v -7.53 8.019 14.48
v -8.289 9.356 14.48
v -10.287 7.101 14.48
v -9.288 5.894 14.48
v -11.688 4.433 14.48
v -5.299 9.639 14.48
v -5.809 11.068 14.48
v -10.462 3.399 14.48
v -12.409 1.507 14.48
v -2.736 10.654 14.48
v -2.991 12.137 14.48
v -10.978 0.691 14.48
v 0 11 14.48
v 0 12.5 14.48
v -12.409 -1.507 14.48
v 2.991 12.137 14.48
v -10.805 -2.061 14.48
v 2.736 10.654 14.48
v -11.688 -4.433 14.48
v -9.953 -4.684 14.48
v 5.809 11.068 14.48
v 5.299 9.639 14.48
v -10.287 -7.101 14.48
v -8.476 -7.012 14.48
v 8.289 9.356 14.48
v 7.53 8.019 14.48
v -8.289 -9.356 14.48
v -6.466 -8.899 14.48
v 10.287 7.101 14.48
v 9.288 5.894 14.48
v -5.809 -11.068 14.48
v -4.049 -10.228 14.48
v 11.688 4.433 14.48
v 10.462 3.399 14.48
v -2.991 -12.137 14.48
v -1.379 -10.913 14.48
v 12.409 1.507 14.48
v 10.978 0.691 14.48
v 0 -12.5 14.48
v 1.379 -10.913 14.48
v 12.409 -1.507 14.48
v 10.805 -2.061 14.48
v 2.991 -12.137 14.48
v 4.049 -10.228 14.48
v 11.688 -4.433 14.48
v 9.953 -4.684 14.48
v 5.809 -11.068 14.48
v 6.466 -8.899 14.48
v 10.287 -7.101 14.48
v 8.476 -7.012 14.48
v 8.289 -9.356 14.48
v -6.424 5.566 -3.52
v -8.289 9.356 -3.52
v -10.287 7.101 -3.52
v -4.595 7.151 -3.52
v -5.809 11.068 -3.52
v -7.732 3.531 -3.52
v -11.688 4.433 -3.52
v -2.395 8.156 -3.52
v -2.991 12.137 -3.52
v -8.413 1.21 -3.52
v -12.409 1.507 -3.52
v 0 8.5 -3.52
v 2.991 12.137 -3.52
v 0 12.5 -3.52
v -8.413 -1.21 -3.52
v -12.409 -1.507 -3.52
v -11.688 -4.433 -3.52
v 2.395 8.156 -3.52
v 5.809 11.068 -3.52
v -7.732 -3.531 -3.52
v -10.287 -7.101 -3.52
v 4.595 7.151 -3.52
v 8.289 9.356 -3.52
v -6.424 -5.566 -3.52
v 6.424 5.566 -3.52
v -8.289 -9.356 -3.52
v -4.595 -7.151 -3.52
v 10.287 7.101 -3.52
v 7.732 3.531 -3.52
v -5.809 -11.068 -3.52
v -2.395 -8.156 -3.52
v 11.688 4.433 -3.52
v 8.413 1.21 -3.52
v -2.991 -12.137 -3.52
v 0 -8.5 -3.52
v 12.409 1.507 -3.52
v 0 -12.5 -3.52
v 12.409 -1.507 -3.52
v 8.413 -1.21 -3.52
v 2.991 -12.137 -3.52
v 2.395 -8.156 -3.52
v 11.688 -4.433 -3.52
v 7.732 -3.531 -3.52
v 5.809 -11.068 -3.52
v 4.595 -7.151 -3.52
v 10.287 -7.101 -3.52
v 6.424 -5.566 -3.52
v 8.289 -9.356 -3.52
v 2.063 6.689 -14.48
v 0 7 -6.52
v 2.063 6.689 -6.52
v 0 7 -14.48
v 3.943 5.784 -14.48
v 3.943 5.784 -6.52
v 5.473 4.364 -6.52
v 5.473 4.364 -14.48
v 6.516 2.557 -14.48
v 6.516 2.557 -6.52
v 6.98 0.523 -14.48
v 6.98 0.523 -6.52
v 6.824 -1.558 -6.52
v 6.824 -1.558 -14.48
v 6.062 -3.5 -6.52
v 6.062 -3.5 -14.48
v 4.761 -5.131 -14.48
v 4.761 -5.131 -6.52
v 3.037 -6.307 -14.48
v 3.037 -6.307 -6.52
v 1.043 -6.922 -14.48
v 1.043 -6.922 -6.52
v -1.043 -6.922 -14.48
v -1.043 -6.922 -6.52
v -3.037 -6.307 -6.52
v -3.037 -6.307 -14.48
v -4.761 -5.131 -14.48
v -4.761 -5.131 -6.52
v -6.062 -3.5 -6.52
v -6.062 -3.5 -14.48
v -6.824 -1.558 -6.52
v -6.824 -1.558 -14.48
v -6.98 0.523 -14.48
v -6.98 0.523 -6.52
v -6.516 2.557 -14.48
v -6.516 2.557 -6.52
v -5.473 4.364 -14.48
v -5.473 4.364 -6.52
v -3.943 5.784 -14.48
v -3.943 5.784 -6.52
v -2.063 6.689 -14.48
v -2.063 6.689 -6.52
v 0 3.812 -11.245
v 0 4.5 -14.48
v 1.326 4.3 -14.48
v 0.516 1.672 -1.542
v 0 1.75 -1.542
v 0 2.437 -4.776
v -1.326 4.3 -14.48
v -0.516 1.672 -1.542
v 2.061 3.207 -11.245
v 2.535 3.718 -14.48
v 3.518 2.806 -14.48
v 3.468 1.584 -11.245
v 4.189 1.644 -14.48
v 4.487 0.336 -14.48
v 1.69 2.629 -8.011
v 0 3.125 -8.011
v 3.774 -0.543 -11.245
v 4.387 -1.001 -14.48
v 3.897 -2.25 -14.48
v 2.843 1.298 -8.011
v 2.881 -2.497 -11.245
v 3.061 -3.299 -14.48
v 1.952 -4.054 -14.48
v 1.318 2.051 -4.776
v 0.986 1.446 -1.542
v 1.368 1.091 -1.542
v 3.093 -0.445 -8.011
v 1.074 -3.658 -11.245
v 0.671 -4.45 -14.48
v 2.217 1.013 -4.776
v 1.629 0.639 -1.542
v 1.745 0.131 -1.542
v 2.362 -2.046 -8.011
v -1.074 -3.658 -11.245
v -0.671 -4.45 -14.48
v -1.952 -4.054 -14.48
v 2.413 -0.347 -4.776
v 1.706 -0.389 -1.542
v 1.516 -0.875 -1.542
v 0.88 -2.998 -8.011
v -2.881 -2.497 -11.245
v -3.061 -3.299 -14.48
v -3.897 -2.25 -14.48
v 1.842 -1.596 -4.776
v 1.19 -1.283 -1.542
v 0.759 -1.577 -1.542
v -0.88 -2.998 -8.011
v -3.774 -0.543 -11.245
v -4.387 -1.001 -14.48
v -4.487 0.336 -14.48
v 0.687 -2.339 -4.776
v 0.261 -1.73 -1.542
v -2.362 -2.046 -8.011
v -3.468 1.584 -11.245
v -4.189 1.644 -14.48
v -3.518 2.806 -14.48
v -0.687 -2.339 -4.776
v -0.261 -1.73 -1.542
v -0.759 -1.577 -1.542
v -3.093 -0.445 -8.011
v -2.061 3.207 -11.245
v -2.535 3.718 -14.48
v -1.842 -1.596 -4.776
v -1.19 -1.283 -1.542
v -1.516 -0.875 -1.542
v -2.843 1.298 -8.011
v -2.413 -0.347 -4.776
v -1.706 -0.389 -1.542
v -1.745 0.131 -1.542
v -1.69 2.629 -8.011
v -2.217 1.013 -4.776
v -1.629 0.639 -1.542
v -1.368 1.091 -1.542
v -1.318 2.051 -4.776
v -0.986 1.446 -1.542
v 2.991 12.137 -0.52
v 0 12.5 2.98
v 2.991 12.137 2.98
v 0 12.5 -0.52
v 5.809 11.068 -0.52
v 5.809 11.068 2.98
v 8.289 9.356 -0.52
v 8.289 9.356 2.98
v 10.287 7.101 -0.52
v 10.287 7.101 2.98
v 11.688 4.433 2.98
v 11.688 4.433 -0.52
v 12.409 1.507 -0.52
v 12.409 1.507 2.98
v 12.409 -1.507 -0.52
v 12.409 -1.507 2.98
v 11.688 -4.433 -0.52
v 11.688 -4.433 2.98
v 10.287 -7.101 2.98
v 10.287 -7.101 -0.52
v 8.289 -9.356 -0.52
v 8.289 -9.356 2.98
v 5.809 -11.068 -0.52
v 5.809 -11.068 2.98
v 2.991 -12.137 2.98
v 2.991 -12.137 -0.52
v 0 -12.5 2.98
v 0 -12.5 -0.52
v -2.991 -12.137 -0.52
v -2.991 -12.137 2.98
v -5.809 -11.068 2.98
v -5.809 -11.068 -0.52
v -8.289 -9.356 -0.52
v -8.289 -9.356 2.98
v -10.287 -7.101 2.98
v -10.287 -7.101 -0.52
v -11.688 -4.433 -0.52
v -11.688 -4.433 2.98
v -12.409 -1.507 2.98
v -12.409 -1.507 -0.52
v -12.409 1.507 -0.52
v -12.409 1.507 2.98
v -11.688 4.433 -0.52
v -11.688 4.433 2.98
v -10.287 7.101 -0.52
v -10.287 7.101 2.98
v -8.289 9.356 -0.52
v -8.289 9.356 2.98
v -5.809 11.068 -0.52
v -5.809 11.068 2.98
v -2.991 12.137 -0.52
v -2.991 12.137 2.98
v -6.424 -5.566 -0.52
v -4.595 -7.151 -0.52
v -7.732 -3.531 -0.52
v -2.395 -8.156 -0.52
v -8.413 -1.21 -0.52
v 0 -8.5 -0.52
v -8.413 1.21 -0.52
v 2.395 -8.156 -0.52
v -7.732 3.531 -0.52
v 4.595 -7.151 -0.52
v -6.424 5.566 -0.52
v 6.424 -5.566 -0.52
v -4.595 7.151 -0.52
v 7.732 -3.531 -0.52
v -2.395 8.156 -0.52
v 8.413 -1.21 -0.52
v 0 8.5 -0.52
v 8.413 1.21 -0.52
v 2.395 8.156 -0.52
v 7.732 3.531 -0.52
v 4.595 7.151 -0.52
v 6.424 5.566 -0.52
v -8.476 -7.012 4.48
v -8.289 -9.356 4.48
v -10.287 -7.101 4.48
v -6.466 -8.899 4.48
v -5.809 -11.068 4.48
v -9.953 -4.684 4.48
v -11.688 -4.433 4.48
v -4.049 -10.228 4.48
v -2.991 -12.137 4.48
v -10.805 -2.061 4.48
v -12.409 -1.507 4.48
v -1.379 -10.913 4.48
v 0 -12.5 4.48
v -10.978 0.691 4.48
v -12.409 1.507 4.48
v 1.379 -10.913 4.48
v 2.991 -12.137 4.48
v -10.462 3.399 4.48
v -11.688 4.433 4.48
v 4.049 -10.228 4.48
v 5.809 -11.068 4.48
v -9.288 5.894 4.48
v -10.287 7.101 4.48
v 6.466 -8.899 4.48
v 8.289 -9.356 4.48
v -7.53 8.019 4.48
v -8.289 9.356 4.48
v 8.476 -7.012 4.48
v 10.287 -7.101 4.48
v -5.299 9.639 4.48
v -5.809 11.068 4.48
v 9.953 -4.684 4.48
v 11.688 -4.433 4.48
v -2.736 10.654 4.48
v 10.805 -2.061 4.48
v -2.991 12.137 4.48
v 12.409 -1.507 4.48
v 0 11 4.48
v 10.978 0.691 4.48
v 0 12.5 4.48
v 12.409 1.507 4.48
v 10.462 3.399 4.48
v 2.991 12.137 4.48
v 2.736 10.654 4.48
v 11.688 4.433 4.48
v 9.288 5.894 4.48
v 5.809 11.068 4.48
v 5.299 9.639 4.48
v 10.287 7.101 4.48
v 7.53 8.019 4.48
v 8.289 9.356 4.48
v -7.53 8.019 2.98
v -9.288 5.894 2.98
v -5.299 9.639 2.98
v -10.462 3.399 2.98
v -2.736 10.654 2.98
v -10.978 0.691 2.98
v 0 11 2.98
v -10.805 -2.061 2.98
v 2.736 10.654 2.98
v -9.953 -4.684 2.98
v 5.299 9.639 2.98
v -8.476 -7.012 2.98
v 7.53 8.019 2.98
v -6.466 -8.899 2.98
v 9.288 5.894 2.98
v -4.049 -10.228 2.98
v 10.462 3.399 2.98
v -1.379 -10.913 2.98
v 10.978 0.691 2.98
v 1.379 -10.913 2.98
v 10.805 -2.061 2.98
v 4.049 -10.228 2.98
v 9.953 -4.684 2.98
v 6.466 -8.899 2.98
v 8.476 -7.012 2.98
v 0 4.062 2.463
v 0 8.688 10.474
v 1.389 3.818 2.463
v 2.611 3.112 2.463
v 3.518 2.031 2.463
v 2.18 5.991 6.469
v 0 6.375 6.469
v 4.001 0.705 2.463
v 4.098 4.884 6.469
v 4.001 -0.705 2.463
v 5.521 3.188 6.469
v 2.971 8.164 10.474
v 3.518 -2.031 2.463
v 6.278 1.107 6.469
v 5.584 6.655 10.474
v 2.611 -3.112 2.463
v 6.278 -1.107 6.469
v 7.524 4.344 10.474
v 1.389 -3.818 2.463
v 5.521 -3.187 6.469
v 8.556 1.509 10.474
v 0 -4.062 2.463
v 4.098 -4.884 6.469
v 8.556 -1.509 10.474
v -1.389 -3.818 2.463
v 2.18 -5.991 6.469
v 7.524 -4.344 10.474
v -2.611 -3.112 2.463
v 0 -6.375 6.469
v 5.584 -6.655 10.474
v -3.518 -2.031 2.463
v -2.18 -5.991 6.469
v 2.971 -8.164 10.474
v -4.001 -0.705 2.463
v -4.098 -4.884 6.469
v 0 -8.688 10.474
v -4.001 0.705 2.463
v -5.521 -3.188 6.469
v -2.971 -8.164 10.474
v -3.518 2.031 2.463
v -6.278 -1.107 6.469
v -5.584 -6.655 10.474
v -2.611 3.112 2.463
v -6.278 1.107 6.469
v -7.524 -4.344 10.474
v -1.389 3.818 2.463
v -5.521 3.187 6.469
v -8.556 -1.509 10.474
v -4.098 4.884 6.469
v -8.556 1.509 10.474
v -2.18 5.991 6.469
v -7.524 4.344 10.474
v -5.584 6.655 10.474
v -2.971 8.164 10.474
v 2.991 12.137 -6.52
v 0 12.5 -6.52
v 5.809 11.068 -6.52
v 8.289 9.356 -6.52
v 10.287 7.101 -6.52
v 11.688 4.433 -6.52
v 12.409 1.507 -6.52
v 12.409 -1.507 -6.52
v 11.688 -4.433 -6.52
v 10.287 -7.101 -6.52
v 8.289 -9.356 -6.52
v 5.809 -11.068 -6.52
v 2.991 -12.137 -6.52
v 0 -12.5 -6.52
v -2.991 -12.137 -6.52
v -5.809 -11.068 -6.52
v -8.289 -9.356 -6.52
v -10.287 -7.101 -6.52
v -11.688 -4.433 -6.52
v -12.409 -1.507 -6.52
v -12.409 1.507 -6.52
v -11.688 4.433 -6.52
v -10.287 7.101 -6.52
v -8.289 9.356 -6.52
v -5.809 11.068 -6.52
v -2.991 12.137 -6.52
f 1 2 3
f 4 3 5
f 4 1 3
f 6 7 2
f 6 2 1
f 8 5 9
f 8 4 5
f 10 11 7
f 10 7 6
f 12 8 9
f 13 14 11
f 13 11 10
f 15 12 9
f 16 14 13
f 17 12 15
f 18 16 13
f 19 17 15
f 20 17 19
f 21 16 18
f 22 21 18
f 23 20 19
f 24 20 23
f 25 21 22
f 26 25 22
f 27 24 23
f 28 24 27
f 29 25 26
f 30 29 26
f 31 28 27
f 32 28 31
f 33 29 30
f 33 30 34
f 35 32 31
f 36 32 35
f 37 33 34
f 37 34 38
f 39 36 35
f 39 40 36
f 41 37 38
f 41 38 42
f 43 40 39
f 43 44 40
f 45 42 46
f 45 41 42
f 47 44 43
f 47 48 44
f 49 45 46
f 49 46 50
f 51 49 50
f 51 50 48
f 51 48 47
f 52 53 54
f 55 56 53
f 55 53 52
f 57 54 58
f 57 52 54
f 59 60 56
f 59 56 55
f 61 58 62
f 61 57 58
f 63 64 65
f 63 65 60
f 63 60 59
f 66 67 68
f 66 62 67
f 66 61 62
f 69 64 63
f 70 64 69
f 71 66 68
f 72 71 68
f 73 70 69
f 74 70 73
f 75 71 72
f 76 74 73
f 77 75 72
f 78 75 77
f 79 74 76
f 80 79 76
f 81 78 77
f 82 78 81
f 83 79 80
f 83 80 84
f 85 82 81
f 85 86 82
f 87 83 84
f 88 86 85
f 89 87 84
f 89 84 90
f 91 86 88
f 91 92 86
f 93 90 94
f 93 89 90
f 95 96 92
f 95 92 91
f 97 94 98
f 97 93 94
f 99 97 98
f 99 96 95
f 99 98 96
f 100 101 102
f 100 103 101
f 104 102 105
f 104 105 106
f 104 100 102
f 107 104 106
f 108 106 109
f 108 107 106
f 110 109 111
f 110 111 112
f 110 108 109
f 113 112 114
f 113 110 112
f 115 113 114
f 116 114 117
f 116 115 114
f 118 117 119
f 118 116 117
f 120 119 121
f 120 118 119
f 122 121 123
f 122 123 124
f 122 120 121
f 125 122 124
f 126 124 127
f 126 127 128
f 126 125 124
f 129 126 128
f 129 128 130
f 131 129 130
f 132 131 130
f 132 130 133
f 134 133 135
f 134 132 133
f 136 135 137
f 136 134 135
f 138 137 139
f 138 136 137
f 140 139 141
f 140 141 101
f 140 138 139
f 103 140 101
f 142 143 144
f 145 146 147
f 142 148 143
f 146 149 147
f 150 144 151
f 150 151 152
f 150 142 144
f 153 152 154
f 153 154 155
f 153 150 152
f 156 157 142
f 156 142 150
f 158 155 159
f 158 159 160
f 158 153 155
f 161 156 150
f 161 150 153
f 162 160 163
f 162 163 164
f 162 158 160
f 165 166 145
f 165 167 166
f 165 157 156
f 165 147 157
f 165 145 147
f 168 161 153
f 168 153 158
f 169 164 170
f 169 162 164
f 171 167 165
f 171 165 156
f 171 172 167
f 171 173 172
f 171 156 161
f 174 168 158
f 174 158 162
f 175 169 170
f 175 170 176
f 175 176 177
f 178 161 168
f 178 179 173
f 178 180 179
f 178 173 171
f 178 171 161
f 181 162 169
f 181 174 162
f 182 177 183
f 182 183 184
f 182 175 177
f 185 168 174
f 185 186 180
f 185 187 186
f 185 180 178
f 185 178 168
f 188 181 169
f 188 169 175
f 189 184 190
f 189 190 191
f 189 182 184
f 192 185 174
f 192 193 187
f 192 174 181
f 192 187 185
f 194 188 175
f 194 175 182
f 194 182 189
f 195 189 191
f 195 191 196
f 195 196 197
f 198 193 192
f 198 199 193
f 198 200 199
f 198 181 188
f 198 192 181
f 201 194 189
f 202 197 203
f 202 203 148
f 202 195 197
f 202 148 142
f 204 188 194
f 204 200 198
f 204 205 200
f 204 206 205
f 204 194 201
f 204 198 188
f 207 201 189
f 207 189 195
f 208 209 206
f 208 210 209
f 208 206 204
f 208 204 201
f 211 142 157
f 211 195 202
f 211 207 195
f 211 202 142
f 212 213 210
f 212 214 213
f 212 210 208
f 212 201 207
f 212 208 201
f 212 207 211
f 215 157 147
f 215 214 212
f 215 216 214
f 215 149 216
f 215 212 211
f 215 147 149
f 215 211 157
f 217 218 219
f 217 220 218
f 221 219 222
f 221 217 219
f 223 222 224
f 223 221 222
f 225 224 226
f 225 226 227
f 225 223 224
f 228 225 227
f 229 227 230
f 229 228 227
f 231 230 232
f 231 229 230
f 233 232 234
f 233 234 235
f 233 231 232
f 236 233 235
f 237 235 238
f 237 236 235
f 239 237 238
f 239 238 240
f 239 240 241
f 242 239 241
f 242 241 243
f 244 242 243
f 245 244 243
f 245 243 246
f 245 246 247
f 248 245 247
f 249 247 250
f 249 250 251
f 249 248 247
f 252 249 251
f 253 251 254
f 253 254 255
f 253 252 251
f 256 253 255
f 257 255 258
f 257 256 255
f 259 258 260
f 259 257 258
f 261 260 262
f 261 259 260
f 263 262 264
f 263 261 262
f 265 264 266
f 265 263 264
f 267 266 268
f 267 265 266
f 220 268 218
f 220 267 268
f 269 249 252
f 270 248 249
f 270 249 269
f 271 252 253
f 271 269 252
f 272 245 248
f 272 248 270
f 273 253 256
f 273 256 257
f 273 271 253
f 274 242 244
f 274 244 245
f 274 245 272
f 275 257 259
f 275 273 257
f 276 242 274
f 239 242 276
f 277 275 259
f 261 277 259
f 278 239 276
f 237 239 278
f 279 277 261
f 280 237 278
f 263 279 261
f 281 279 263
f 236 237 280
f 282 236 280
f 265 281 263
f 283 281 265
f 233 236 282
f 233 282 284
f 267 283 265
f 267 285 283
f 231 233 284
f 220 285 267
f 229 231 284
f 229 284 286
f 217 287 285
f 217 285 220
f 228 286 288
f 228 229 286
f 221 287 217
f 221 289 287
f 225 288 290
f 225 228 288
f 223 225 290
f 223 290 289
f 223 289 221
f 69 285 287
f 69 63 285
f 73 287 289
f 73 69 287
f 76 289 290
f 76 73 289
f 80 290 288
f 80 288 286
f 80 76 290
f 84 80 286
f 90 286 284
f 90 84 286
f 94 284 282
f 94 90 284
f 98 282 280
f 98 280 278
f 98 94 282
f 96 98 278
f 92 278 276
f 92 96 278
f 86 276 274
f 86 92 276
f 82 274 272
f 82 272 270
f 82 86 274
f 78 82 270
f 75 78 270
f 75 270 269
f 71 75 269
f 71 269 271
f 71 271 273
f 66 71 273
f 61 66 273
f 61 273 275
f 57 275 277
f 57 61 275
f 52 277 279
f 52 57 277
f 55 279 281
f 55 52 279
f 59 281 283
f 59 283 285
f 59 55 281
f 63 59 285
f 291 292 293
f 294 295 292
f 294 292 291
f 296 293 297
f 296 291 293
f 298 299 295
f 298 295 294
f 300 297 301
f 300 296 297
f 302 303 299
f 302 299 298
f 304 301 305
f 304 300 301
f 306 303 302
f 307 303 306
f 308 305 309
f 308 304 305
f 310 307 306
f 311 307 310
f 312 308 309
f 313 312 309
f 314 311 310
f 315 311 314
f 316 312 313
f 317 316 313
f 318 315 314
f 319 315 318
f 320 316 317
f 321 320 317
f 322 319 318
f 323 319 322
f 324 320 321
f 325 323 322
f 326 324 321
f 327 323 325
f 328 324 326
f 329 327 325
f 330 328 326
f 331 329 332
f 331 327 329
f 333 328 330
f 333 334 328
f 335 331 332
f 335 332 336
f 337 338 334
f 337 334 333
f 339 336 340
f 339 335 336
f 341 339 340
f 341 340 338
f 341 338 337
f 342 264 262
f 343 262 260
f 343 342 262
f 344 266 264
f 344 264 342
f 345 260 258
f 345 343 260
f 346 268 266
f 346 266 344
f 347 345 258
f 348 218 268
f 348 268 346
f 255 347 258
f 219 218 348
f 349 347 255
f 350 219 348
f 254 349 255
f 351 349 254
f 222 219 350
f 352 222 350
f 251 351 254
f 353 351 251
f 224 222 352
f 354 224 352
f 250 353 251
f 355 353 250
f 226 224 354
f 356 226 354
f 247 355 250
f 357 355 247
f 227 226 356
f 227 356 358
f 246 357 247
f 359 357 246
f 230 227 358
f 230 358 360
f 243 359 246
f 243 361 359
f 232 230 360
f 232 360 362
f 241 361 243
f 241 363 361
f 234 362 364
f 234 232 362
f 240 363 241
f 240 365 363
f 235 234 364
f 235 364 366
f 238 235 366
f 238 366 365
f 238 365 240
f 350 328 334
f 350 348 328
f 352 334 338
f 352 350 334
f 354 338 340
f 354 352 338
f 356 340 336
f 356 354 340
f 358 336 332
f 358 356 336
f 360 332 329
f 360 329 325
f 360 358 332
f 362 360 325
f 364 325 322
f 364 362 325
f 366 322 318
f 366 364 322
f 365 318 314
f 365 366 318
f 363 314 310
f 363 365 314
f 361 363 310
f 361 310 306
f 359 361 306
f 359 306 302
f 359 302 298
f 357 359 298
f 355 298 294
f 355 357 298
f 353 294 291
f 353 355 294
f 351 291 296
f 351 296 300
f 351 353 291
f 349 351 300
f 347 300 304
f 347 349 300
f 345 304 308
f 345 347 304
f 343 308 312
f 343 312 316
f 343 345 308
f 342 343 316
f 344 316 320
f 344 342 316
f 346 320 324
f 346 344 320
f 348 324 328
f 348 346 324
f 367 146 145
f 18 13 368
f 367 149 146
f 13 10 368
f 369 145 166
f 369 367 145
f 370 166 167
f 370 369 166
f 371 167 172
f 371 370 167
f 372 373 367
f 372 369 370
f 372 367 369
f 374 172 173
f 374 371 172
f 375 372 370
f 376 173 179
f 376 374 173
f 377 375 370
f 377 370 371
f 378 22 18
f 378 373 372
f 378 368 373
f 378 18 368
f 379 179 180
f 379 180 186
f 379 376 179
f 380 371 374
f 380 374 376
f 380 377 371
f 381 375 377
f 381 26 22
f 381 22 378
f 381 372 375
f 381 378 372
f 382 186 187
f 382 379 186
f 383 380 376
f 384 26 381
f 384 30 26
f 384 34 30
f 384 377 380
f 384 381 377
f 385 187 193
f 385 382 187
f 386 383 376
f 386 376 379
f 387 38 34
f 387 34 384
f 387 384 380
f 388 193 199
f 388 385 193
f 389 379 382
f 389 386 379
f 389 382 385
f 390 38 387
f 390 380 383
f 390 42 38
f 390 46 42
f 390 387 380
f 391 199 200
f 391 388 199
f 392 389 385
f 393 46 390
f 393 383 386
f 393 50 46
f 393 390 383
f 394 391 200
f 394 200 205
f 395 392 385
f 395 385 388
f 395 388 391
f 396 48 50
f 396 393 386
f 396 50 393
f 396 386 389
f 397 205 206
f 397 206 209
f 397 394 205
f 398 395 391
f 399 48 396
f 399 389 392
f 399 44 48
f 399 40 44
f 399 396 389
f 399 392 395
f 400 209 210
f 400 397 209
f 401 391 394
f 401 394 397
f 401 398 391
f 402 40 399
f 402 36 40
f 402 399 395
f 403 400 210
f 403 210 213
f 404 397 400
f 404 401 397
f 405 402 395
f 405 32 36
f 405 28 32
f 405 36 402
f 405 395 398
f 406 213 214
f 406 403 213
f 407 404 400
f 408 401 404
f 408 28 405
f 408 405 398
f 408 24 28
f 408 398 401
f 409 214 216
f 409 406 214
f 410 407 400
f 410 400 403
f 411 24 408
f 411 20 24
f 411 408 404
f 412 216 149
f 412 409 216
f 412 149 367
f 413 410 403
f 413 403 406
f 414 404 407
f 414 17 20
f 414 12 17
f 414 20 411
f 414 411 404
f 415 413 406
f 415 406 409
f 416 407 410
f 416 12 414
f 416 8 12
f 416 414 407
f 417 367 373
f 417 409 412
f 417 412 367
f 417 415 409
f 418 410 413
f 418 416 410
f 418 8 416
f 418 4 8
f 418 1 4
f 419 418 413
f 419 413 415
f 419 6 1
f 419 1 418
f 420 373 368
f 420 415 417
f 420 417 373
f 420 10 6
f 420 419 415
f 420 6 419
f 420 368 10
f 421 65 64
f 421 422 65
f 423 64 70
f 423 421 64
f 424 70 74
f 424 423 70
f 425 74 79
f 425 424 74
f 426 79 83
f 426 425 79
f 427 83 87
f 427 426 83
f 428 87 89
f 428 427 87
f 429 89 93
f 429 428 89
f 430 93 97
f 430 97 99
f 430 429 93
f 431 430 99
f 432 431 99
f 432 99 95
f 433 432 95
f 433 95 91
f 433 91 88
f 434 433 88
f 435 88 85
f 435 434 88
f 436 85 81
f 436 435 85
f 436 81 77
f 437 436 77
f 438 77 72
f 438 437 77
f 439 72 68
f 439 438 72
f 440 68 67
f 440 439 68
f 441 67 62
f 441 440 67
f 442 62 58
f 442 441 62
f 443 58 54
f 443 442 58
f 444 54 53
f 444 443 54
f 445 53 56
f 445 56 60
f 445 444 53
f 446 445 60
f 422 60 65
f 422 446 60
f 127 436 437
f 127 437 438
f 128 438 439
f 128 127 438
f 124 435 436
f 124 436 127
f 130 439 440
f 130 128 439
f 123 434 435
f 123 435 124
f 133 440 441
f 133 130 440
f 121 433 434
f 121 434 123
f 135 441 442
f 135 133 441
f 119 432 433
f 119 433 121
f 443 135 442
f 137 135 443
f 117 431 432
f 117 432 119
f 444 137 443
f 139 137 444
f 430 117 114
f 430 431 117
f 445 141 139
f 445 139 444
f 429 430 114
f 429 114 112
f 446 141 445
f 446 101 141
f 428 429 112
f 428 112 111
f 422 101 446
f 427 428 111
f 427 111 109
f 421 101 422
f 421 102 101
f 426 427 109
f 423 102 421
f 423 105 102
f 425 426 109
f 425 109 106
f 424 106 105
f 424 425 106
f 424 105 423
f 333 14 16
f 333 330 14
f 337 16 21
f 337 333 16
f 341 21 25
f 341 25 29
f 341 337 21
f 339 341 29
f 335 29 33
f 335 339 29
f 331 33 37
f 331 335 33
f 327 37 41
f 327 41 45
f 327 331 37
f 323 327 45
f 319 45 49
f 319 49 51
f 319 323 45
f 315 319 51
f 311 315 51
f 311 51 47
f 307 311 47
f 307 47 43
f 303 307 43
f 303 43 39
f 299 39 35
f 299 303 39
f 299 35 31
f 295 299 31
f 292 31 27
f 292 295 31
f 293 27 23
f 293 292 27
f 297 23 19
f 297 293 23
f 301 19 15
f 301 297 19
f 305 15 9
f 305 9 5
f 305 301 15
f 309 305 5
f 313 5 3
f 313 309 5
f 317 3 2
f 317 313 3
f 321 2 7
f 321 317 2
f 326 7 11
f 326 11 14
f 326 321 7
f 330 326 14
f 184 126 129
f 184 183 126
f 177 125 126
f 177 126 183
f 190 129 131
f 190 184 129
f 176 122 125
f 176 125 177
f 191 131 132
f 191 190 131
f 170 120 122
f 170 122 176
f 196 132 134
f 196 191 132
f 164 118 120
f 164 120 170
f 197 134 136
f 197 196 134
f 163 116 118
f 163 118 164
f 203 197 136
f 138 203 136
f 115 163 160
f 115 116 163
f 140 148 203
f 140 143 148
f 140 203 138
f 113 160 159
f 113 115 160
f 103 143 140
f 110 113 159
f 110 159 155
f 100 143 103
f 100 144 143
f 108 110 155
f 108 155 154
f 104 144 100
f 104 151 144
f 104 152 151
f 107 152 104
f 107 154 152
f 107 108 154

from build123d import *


with BuildPart() as part:
    # Esquisse1 → Révolution1 (revolve)
    with BuildSketch(Plane(origin=(0, 0, 0), x_dir=(0, 0, -1), z_dir=(1, 0, 0))):
        Polygon((-14.479601386, 12.5), (-4.479601386, 12.5), (-4.479601386, 11), (-2.979601386, 11), (-2.979601386, 12.5), (0.520398614, 12.5), (0.520398614, 8.5), (3.520398614, 8.5), (3.520398614, 12.5), (6.520398614, 12.5), (6.520398614, 7), (14.479601386, 7), (14.479601386, 4.5), (1.541868584, 1.75), (-14.479601386, 11), align=None)
    revolve(axis=Axis((0, 0, 14.479601386), (0, 0, -1)))


solid = part.part
